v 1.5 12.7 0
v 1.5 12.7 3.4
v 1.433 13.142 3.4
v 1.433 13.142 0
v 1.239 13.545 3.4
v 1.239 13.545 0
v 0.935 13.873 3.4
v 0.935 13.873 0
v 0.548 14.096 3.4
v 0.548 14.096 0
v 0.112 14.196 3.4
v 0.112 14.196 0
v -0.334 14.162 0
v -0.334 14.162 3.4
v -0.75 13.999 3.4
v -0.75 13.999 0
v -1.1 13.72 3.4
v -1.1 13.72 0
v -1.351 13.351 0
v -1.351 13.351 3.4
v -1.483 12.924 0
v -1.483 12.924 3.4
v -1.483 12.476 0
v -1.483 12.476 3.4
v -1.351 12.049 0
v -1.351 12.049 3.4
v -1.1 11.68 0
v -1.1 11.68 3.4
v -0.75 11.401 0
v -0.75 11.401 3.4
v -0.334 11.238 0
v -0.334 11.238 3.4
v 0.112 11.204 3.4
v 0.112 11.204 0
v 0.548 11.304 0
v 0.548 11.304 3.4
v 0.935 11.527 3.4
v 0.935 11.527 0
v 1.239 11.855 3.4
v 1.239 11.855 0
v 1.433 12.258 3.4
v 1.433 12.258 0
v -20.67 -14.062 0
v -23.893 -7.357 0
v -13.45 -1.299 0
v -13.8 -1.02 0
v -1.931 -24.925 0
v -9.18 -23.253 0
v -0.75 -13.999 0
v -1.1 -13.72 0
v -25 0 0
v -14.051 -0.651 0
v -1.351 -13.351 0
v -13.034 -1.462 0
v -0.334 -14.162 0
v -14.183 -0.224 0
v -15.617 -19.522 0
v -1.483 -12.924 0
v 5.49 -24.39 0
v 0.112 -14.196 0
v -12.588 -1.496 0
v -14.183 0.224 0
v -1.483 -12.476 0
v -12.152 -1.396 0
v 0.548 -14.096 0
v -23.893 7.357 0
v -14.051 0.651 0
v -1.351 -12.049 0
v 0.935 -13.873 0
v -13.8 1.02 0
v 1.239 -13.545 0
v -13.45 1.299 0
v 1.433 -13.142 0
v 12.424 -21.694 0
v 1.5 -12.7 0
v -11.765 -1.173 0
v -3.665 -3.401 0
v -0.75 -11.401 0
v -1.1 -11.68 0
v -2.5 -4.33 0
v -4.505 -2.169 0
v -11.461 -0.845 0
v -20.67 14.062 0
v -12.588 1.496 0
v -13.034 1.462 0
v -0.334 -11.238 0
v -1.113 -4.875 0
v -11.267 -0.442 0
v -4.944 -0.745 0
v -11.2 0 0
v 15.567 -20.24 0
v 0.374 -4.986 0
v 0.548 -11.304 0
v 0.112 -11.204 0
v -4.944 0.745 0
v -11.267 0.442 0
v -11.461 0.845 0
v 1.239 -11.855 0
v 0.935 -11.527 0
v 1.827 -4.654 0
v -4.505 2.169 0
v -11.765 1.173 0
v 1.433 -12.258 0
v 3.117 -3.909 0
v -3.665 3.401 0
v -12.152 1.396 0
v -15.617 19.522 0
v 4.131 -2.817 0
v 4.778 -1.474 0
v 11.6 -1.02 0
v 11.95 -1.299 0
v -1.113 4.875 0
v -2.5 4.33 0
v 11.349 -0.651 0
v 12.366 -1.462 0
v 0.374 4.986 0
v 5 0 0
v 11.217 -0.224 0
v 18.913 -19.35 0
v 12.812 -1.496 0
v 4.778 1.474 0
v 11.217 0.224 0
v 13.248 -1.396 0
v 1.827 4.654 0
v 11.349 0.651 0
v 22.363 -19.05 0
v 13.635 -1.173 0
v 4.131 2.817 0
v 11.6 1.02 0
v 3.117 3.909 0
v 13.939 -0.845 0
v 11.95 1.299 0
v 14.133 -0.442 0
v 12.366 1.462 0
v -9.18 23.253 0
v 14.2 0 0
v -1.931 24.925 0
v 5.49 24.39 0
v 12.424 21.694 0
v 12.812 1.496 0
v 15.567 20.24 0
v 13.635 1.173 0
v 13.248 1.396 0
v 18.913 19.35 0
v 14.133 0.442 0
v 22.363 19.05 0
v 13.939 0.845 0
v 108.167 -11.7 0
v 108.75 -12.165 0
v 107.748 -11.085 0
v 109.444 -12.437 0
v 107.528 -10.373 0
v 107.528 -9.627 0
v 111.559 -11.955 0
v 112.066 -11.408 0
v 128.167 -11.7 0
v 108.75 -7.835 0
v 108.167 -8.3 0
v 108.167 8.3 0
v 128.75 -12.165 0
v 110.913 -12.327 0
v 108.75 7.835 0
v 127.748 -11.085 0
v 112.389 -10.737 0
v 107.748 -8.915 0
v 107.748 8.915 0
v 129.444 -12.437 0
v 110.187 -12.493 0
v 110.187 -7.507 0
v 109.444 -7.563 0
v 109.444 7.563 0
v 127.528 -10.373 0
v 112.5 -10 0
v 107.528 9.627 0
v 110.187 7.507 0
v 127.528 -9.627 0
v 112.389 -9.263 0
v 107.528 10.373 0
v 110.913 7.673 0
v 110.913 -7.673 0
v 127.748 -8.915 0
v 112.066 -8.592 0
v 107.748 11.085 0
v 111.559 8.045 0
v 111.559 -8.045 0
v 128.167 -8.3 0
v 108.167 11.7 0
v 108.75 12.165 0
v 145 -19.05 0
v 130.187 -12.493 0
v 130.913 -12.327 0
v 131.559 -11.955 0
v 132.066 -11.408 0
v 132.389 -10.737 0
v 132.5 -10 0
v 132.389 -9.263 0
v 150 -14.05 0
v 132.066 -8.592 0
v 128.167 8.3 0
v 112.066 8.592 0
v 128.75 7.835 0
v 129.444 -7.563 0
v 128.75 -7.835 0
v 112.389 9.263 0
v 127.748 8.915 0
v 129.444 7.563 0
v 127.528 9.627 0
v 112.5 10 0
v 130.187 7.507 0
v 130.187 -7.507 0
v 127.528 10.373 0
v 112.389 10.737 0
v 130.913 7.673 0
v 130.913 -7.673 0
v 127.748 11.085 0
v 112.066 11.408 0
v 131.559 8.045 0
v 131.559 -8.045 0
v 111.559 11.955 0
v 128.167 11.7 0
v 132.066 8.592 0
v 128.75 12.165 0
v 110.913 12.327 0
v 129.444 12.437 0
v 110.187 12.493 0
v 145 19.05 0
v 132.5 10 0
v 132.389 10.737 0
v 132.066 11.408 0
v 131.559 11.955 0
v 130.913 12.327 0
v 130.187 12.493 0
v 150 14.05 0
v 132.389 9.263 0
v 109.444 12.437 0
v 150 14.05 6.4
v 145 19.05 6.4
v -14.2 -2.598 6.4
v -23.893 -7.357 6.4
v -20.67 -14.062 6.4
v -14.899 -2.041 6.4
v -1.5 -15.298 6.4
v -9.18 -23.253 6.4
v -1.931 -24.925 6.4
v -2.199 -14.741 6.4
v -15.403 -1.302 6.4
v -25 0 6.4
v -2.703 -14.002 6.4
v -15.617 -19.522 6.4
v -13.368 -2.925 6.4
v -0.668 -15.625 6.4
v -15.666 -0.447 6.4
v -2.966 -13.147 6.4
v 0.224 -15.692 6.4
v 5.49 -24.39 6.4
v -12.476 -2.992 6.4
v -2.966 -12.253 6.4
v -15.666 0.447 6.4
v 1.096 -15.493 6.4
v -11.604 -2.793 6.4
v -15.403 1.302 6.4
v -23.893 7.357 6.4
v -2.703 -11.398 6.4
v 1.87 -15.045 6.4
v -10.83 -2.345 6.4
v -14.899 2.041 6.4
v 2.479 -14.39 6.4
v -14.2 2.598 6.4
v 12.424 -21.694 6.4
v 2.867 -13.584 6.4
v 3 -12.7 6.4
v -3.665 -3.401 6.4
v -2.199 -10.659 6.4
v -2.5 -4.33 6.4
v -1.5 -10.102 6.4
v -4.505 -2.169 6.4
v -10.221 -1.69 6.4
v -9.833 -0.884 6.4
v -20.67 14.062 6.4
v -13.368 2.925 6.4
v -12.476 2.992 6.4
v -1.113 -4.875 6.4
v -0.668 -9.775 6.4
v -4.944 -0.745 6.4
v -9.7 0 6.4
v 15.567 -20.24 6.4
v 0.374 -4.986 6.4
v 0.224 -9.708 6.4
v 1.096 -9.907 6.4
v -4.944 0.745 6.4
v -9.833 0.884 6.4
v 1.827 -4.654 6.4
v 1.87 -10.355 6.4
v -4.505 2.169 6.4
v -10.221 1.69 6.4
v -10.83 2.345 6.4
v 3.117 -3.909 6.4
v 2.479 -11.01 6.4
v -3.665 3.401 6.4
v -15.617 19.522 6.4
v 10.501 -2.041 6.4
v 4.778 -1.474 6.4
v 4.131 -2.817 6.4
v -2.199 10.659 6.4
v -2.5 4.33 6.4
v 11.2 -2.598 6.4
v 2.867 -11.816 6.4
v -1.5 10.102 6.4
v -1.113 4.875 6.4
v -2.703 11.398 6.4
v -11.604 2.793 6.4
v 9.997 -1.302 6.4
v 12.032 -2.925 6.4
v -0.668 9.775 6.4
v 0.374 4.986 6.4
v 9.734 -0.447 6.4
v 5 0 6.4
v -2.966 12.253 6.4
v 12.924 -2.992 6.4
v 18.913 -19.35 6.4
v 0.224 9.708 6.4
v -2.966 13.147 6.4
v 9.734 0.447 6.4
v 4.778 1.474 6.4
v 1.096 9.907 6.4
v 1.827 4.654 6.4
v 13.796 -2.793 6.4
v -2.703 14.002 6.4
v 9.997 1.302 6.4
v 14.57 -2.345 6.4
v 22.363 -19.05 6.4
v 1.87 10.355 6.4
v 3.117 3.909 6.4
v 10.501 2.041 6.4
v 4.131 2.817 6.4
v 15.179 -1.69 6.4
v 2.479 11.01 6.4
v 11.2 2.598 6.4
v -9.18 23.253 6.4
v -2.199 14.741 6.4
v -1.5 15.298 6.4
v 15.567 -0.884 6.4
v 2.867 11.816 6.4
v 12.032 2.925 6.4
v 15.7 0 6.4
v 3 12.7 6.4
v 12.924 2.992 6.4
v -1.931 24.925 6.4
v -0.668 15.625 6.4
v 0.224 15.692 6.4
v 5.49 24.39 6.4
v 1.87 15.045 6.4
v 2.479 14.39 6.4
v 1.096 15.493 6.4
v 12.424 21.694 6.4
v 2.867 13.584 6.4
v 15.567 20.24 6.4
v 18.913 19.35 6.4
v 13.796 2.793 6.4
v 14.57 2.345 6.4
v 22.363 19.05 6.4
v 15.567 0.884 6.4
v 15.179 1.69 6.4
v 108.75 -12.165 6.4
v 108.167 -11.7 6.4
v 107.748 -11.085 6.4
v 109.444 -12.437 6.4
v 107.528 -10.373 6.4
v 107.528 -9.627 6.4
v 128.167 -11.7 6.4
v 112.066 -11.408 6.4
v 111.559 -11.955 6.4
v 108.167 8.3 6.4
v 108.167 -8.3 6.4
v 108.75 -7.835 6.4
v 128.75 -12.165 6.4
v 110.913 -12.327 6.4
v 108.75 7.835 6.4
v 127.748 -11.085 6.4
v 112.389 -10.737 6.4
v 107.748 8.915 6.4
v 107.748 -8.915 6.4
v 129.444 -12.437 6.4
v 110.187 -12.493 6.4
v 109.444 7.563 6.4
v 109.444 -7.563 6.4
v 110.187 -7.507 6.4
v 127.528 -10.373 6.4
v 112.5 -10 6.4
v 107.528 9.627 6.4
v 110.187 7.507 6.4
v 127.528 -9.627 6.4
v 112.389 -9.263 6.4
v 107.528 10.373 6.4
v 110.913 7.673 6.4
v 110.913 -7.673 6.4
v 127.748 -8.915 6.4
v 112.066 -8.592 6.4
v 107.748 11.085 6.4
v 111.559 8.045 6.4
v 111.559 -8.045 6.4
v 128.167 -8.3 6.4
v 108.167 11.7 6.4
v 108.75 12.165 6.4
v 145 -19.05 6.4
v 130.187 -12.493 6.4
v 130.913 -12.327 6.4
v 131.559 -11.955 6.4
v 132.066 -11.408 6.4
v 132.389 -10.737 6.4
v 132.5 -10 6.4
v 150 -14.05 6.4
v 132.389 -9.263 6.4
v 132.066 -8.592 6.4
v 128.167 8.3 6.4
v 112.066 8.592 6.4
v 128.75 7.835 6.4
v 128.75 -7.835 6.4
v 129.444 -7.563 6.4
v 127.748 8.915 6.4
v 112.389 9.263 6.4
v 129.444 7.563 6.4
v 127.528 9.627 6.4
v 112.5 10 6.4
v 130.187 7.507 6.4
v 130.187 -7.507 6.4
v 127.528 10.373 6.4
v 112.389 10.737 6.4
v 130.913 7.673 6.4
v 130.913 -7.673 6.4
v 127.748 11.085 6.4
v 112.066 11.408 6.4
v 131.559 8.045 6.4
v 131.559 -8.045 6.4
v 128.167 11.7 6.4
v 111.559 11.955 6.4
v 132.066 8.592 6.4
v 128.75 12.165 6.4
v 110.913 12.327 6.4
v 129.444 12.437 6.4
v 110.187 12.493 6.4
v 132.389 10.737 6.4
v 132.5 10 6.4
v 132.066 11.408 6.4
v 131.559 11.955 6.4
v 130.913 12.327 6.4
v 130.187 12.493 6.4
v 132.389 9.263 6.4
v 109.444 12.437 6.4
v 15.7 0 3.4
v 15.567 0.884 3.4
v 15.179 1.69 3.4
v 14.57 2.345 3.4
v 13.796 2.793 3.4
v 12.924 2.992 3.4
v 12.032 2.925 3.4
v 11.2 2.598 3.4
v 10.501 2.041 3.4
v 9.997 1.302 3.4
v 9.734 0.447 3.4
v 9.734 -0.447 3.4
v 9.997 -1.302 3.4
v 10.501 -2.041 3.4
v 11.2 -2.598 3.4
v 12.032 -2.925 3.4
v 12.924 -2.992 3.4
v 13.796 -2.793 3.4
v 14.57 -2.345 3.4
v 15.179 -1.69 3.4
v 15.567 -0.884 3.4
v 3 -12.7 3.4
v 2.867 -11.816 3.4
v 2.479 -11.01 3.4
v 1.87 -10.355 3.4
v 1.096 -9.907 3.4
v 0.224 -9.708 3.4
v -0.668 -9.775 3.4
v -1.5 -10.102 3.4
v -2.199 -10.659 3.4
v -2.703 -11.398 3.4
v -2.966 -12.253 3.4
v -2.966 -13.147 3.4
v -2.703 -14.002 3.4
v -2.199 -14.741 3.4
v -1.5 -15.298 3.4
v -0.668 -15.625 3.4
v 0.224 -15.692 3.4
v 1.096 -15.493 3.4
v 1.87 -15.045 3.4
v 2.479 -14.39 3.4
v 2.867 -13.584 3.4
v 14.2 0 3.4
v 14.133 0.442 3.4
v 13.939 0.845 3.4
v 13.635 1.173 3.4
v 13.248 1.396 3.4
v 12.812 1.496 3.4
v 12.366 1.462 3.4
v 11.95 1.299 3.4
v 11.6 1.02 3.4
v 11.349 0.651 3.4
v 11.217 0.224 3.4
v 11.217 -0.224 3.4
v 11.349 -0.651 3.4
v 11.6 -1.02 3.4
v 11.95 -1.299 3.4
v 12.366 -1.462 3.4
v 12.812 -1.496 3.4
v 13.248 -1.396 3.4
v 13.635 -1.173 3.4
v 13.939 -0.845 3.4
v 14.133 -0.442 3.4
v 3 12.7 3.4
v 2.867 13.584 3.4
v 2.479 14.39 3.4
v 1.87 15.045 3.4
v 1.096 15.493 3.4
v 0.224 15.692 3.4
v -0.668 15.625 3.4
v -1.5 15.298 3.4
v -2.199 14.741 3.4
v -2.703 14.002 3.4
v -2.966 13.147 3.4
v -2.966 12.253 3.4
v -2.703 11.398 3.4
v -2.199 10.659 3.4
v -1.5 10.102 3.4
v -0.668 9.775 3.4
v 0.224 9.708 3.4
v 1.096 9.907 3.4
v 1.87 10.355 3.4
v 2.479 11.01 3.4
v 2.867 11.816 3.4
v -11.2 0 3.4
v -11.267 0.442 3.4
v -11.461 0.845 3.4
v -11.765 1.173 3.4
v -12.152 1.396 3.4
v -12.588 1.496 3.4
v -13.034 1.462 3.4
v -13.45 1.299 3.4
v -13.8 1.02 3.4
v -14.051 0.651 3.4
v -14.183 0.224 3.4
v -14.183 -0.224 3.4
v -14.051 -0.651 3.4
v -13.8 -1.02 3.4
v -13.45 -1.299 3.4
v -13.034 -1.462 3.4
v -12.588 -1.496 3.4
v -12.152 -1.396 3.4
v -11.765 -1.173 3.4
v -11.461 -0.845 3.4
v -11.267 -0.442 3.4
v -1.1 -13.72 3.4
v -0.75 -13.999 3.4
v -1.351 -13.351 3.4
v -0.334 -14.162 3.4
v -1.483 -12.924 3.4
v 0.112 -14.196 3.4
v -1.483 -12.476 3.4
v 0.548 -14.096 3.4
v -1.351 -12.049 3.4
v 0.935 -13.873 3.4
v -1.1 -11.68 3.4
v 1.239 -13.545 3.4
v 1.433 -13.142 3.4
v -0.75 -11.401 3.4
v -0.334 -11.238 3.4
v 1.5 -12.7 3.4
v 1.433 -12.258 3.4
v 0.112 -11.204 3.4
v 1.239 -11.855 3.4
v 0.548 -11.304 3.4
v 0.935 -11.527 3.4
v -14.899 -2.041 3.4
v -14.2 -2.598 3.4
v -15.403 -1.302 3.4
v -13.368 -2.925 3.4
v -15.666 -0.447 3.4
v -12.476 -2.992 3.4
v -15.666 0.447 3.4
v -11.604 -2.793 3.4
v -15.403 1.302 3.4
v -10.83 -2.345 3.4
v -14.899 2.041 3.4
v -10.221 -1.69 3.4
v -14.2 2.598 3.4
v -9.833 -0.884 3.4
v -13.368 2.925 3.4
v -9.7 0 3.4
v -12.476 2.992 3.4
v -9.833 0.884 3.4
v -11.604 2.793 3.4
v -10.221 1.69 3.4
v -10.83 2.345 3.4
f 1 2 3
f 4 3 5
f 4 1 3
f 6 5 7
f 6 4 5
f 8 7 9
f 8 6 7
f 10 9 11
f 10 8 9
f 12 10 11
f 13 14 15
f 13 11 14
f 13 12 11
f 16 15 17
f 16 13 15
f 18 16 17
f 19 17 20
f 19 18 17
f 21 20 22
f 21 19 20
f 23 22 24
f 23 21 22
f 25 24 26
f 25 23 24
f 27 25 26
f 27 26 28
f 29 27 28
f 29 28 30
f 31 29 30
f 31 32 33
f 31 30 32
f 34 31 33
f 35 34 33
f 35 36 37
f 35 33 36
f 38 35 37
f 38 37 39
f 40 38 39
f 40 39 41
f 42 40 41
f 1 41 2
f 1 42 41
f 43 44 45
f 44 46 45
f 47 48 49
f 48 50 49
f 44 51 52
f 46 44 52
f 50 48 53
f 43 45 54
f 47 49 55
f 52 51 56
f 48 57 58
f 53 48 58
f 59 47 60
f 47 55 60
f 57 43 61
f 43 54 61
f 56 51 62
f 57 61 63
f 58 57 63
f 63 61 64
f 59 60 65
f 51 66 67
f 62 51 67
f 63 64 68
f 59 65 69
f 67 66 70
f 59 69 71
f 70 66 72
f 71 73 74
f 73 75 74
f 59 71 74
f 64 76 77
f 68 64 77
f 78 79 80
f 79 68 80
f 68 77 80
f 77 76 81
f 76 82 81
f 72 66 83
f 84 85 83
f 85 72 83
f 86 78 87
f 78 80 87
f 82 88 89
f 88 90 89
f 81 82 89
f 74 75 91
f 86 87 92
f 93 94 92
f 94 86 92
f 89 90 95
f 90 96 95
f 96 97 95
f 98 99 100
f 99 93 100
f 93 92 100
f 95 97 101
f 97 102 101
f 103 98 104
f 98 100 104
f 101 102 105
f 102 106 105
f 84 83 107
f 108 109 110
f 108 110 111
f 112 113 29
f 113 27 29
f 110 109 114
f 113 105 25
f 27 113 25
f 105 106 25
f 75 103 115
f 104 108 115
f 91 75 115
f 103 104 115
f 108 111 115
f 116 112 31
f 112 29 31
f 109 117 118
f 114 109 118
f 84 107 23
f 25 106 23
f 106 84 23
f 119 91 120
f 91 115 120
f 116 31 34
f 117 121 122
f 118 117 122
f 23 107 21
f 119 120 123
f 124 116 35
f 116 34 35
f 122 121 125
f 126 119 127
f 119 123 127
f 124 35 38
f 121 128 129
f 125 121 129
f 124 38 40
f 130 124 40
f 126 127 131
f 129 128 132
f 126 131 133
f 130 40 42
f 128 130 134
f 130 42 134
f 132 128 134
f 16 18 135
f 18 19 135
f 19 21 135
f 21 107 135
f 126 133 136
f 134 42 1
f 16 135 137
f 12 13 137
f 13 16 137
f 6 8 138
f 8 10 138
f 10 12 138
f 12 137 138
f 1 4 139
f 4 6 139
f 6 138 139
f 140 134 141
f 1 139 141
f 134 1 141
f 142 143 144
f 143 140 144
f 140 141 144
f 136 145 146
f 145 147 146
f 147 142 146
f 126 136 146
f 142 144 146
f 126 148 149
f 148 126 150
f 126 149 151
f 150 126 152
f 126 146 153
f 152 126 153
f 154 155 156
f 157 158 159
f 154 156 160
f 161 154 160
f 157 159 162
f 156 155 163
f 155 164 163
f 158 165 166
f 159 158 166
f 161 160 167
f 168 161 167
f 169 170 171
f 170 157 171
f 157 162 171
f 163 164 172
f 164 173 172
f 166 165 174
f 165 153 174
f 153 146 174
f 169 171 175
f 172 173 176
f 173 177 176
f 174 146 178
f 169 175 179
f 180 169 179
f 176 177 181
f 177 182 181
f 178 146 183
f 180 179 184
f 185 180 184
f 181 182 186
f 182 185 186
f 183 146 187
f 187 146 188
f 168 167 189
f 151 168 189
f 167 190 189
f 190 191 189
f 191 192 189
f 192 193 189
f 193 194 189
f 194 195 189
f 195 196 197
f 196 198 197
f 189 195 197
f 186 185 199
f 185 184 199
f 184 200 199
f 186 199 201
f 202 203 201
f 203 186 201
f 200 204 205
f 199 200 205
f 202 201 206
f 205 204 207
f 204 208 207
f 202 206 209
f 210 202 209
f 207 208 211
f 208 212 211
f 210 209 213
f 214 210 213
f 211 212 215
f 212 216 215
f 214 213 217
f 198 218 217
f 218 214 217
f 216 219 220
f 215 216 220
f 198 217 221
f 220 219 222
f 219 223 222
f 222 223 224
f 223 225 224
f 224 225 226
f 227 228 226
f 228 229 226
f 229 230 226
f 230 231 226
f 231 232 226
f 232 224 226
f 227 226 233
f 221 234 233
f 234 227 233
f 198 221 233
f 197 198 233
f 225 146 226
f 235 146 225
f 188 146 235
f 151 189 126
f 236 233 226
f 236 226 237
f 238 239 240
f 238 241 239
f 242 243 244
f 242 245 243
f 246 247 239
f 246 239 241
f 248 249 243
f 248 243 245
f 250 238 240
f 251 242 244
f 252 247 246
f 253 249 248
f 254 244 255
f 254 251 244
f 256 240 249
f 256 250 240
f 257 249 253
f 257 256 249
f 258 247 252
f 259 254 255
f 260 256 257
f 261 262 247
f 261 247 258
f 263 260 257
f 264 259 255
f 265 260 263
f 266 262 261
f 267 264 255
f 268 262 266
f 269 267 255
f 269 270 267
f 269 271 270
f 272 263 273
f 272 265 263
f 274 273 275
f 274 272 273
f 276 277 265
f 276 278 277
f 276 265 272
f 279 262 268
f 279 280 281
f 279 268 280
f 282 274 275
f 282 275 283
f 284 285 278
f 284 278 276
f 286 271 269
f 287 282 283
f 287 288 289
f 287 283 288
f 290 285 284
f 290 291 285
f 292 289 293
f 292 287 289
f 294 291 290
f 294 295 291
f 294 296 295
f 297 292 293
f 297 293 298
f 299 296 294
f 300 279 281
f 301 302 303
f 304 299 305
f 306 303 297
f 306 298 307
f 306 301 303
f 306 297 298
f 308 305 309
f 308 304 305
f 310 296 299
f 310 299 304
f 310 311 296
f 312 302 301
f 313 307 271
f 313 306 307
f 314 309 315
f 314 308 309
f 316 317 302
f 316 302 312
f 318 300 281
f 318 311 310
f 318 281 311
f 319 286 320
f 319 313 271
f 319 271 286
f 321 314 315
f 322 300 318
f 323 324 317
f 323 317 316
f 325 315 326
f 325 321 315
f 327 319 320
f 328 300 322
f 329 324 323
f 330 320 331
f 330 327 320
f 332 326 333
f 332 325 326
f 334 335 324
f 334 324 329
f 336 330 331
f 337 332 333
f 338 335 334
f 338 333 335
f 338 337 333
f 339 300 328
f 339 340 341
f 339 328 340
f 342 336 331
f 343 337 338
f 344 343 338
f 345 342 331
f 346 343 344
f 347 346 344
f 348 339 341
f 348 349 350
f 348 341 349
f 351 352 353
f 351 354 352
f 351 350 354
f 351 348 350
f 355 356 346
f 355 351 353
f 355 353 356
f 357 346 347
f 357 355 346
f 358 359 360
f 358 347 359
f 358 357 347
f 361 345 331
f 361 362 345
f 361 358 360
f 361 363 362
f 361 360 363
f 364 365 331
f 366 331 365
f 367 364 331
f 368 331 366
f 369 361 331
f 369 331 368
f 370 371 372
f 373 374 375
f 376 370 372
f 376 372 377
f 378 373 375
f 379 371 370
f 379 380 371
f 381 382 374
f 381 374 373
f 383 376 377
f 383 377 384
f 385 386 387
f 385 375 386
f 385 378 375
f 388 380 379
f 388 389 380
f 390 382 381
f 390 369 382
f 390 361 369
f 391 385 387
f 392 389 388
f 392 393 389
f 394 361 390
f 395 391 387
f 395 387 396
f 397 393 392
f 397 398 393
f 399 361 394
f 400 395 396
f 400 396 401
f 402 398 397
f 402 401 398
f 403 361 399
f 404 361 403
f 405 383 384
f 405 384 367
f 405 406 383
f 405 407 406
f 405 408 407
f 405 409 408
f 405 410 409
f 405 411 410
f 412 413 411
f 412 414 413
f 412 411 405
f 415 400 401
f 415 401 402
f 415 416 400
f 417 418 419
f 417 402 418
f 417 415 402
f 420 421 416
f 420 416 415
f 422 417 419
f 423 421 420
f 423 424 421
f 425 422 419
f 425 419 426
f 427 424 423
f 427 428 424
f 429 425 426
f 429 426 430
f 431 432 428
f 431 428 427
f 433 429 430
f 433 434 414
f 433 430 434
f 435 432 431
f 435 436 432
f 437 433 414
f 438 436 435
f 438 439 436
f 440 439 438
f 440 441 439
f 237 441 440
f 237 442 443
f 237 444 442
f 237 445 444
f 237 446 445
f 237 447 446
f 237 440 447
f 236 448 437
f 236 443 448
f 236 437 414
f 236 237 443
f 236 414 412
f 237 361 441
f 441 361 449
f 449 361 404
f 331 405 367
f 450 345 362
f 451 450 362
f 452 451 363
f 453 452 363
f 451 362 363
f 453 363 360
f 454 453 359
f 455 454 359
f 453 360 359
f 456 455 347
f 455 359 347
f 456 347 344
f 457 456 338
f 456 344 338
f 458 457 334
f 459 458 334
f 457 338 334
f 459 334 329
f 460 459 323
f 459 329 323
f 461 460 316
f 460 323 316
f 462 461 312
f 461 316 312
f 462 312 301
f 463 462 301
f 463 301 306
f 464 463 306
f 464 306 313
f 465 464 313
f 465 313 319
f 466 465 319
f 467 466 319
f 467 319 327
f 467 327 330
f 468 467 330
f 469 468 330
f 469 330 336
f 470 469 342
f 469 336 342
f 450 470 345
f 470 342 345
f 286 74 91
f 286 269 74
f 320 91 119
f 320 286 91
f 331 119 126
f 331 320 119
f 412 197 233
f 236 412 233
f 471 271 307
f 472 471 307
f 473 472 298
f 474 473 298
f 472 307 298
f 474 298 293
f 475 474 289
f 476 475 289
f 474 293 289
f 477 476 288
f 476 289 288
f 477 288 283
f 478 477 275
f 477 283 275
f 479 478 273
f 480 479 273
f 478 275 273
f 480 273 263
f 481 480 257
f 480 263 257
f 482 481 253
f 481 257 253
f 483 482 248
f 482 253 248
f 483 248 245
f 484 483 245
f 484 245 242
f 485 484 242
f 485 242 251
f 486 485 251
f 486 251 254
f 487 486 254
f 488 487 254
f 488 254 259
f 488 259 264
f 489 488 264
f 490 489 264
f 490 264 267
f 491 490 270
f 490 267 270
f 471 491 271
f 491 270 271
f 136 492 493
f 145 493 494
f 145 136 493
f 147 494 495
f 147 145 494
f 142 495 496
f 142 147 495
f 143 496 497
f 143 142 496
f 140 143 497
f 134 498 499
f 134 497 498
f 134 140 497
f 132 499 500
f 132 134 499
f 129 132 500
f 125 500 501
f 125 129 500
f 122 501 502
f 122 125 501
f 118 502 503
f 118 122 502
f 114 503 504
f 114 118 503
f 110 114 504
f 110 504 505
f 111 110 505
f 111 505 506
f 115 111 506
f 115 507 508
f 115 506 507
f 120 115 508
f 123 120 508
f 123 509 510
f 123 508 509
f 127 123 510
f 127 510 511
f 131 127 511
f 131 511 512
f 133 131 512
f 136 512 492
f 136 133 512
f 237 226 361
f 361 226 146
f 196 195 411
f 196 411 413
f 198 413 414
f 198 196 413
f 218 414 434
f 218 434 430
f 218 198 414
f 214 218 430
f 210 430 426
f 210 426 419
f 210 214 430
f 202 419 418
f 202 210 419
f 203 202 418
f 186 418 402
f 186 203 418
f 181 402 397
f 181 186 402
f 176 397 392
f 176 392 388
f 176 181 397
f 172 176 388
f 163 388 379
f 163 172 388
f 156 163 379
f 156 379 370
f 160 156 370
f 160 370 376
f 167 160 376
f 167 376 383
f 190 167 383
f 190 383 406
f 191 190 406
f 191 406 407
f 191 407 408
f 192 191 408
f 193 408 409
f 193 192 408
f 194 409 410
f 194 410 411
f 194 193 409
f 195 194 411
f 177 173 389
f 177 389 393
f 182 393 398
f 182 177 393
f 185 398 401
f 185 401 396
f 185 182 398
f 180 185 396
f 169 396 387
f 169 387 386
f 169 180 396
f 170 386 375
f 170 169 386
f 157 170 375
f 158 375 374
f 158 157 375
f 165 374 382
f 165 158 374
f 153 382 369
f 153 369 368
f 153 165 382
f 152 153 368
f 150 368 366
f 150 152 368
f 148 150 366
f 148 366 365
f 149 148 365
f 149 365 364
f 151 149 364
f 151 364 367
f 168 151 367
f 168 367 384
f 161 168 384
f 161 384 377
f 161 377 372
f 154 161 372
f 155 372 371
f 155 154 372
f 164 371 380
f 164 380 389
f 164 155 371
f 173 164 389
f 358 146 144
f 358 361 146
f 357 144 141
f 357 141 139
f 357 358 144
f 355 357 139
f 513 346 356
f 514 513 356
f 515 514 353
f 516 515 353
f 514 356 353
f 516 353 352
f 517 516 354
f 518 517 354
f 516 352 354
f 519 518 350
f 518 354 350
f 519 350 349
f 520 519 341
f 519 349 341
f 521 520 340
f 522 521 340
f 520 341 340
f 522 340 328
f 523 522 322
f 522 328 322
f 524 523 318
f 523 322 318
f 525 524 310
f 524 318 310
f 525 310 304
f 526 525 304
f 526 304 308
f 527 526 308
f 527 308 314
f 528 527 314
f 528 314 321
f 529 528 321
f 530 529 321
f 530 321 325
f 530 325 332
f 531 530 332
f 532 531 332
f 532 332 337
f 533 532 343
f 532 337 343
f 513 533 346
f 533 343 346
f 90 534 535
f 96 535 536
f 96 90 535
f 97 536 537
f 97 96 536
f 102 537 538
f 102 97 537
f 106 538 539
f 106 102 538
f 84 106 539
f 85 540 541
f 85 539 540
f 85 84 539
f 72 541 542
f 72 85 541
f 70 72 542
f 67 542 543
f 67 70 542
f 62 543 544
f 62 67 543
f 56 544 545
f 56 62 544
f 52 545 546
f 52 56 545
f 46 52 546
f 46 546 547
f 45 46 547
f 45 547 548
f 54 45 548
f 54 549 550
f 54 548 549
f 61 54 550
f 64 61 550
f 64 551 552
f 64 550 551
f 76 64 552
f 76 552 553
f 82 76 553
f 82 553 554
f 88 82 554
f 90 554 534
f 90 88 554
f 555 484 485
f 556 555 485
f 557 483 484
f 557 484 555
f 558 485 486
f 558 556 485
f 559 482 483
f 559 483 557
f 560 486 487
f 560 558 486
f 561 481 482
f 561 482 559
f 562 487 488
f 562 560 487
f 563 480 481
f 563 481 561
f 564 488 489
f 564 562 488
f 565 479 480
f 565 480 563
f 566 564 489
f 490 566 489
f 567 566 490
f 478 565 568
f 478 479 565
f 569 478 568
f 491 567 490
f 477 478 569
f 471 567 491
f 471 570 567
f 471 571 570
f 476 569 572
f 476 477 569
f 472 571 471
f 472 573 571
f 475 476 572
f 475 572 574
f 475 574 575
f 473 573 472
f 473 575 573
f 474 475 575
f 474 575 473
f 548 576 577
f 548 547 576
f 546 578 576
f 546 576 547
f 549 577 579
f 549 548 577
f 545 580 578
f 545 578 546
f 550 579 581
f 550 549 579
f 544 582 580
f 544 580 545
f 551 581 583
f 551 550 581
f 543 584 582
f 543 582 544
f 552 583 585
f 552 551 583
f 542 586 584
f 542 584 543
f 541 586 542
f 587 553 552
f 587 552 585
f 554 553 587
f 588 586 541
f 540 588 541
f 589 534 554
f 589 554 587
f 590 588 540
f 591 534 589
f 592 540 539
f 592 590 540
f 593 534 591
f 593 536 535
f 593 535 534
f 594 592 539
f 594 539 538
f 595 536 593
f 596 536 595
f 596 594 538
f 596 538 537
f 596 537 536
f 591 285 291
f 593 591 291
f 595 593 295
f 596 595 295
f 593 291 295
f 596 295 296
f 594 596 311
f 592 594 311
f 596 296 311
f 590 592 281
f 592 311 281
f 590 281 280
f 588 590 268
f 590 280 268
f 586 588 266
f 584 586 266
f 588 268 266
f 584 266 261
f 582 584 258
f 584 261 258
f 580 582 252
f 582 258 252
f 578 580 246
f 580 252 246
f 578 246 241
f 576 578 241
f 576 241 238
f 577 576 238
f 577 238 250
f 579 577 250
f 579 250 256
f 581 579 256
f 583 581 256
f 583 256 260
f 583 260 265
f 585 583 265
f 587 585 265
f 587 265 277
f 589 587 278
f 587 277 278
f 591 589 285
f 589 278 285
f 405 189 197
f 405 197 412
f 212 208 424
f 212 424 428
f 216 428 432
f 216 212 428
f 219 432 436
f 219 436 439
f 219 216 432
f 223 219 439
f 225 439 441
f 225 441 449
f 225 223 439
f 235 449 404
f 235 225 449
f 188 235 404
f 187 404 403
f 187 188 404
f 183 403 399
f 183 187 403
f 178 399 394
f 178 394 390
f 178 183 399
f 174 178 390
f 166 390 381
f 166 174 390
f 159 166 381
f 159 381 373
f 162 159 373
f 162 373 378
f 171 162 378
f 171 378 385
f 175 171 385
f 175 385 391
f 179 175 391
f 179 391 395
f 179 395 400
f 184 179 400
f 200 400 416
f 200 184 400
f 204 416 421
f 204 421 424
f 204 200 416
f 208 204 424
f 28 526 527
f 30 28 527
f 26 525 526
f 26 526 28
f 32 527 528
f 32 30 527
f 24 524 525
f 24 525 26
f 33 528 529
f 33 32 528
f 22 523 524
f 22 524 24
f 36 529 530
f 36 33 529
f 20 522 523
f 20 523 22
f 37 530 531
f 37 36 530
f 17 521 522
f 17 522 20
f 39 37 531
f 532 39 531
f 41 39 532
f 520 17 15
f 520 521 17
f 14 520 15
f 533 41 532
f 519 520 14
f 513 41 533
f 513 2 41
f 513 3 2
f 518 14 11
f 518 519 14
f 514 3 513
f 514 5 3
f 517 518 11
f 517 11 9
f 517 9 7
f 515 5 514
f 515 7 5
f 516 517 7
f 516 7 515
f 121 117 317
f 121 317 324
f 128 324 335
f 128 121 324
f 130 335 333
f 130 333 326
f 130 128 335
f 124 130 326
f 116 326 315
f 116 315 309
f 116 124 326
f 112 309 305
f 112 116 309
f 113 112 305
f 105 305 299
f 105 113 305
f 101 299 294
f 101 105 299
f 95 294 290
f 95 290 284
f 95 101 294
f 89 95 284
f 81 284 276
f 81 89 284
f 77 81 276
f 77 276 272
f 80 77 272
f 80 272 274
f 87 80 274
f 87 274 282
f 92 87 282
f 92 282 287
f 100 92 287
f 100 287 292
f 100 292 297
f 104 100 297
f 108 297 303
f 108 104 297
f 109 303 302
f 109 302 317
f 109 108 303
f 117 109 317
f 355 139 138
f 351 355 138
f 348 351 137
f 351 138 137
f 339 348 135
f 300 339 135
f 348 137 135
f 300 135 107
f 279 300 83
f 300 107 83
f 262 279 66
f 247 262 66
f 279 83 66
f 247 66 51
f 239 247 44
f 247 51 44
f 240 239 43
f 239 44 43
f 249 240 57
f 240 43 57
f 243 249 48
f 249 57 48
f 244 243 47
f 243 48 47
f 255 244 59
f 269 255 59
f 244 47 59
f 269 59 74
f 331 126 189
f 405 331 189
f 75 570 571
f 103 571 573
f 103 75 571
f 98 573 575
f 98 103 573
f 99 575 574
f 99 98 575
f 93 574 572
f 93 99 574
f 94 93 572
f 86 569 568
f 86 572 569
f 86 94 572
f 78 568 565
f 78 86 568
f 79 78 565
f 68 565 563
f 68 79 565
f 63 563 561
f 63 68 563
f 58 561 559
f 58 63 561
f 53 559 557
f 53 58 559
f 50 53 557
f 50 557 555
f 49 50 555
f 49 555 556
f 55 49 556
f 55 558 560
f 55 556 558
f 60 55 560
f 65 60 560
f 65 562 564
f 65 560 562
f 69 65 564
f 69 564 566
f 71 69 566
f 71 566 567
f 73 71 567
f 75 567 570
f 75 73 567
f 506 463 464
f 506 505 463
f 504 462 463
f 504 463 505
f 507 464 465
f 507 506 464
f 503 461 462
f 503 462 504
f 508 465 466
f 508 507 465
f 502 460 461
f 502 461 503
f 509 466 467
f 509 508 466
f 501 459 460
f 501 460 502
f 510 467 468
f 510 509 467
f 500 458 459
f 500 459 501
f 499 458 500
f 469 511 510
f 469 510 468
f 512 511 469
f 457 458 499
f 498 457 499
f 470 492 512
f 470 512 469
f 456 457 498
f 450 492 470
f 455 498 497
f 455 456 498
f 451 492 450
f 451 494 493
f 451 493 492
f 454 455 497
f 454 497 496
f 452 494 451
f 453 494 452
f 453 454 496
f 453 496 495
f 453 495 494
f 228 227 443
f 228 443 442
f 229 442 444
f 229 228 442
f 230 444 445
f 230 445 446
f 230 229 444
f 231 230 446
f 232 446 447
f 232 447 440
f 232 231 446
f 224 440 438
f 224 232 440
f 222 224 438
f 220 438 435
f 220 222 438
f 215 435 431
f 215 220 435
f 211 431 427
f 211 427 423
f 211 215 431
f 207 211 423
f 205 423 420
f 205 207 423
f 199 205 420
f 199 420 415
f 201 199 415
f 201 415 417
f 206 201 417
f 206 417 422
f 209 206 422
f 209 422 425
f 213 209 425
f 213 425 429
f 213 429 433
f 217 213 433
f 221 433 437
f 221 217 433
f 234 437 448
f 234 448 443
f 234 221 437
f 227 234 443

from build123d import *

# Parameters (mm, degrees)
SKETCH1_R           = 5
SKETCH1_R_2         = 2.5
SKETCH1_R_3         = 1.5
BOSS_EXTRUDE1_DEPTH = 6.4
SKETCH2_R           = 3
CUT_EXTRUDE1_DEPTH  = 3
CHAMFER1_SIZE       = 5
FILLET1_R           = 20


with BuildPart() as part:
    # Sketch1 → Boss-Extrude1 (new body)
    with BuildSketch(Plane.XY):
        with BuildLine():
            Line((150, 19.05), (16.189425561, 19.05))
            ThreePointArc((16.189425561, 19.05), (-25, 0), (16.189425561, -19.05))
            Line((16.189425561, -19.05), (150, -19.05))
            Line((150, -19.05), (150, 19.05))
        make_face()
        Circle(SKETCH1_R, mode=Mode.SUBTRACT)
        with Locations((130, 10)):
            Circle(SKETCH1_R_2, mode=Mode.SUBTRACT)
        with Locations((110, 10)):
            Circle(SKETCH1_R_2, mode=Mode.SUBTRACT)
        with Locations((110, -10)):
            Circle(SKETCH1_R_2, mode=Mode.SUBTRACT)
        with Locations((130, -10)):
            Circle(SKETCH1_R_2, mode=Mode.SUBTRACT)
        with Locations((0, 12.7)):
            Circle(SKETCH1_R_3, mode=Mode.SUBTRACT)
        with Locations((0, -12.7)):
            Circle(SKETCH1_R_3, mode=Mode.SUBTRACT)
        with Locations((12.7, 0)):
            Circle(SKETCH1_R_3, mode=Mode.SUBTRACT)
        with Locations((-12.7, 0)):
            Circle(SKETCH1_R_3, mode=Mode.SUBTRACT)
    extrude(amount=BOSS_EXTRUDE1_DEPTH)

    # Sketch2 → Cut-Extrude1 (cut)
    with BuildSketch(Plane.XY.offset(6.4)):
        with Locations((0, 12.7)):
            Circle(SKETCH2_R)
        with Locations((12.7, 0)):
            Circle(SKETCH2_R)
        with Locations((0, -12.7)):
            Circle(SKETCH2_R)
        with Locations((-12.7, 0)):
            Circle(SKETCH2_R)
    extrude(amount=-CUT_EXTRUDE1_DEPTH, mode=Mode.SUBTRACT)

    # Chamfer1
    chamfer1_edges = [part.edges().sort_by_distance(p)[0] for p in [
        (150, -19.05, 3.2),
        (150, 19.05, 3.2),
    ]]
    chamfer(chamfer1_edges, length=CHAMFER1_SIZE)

    # Fillet1
    fillet1_edges = [part.edges().sort_by_distance(p)[0] for p in [
        (16.189425561, -19.05, 3.2),
        (16.189425561, 19.05, 3.2),
    ]]
    fillet(fillet1_edges, radius=FILLET1_R)


solid = part.part
